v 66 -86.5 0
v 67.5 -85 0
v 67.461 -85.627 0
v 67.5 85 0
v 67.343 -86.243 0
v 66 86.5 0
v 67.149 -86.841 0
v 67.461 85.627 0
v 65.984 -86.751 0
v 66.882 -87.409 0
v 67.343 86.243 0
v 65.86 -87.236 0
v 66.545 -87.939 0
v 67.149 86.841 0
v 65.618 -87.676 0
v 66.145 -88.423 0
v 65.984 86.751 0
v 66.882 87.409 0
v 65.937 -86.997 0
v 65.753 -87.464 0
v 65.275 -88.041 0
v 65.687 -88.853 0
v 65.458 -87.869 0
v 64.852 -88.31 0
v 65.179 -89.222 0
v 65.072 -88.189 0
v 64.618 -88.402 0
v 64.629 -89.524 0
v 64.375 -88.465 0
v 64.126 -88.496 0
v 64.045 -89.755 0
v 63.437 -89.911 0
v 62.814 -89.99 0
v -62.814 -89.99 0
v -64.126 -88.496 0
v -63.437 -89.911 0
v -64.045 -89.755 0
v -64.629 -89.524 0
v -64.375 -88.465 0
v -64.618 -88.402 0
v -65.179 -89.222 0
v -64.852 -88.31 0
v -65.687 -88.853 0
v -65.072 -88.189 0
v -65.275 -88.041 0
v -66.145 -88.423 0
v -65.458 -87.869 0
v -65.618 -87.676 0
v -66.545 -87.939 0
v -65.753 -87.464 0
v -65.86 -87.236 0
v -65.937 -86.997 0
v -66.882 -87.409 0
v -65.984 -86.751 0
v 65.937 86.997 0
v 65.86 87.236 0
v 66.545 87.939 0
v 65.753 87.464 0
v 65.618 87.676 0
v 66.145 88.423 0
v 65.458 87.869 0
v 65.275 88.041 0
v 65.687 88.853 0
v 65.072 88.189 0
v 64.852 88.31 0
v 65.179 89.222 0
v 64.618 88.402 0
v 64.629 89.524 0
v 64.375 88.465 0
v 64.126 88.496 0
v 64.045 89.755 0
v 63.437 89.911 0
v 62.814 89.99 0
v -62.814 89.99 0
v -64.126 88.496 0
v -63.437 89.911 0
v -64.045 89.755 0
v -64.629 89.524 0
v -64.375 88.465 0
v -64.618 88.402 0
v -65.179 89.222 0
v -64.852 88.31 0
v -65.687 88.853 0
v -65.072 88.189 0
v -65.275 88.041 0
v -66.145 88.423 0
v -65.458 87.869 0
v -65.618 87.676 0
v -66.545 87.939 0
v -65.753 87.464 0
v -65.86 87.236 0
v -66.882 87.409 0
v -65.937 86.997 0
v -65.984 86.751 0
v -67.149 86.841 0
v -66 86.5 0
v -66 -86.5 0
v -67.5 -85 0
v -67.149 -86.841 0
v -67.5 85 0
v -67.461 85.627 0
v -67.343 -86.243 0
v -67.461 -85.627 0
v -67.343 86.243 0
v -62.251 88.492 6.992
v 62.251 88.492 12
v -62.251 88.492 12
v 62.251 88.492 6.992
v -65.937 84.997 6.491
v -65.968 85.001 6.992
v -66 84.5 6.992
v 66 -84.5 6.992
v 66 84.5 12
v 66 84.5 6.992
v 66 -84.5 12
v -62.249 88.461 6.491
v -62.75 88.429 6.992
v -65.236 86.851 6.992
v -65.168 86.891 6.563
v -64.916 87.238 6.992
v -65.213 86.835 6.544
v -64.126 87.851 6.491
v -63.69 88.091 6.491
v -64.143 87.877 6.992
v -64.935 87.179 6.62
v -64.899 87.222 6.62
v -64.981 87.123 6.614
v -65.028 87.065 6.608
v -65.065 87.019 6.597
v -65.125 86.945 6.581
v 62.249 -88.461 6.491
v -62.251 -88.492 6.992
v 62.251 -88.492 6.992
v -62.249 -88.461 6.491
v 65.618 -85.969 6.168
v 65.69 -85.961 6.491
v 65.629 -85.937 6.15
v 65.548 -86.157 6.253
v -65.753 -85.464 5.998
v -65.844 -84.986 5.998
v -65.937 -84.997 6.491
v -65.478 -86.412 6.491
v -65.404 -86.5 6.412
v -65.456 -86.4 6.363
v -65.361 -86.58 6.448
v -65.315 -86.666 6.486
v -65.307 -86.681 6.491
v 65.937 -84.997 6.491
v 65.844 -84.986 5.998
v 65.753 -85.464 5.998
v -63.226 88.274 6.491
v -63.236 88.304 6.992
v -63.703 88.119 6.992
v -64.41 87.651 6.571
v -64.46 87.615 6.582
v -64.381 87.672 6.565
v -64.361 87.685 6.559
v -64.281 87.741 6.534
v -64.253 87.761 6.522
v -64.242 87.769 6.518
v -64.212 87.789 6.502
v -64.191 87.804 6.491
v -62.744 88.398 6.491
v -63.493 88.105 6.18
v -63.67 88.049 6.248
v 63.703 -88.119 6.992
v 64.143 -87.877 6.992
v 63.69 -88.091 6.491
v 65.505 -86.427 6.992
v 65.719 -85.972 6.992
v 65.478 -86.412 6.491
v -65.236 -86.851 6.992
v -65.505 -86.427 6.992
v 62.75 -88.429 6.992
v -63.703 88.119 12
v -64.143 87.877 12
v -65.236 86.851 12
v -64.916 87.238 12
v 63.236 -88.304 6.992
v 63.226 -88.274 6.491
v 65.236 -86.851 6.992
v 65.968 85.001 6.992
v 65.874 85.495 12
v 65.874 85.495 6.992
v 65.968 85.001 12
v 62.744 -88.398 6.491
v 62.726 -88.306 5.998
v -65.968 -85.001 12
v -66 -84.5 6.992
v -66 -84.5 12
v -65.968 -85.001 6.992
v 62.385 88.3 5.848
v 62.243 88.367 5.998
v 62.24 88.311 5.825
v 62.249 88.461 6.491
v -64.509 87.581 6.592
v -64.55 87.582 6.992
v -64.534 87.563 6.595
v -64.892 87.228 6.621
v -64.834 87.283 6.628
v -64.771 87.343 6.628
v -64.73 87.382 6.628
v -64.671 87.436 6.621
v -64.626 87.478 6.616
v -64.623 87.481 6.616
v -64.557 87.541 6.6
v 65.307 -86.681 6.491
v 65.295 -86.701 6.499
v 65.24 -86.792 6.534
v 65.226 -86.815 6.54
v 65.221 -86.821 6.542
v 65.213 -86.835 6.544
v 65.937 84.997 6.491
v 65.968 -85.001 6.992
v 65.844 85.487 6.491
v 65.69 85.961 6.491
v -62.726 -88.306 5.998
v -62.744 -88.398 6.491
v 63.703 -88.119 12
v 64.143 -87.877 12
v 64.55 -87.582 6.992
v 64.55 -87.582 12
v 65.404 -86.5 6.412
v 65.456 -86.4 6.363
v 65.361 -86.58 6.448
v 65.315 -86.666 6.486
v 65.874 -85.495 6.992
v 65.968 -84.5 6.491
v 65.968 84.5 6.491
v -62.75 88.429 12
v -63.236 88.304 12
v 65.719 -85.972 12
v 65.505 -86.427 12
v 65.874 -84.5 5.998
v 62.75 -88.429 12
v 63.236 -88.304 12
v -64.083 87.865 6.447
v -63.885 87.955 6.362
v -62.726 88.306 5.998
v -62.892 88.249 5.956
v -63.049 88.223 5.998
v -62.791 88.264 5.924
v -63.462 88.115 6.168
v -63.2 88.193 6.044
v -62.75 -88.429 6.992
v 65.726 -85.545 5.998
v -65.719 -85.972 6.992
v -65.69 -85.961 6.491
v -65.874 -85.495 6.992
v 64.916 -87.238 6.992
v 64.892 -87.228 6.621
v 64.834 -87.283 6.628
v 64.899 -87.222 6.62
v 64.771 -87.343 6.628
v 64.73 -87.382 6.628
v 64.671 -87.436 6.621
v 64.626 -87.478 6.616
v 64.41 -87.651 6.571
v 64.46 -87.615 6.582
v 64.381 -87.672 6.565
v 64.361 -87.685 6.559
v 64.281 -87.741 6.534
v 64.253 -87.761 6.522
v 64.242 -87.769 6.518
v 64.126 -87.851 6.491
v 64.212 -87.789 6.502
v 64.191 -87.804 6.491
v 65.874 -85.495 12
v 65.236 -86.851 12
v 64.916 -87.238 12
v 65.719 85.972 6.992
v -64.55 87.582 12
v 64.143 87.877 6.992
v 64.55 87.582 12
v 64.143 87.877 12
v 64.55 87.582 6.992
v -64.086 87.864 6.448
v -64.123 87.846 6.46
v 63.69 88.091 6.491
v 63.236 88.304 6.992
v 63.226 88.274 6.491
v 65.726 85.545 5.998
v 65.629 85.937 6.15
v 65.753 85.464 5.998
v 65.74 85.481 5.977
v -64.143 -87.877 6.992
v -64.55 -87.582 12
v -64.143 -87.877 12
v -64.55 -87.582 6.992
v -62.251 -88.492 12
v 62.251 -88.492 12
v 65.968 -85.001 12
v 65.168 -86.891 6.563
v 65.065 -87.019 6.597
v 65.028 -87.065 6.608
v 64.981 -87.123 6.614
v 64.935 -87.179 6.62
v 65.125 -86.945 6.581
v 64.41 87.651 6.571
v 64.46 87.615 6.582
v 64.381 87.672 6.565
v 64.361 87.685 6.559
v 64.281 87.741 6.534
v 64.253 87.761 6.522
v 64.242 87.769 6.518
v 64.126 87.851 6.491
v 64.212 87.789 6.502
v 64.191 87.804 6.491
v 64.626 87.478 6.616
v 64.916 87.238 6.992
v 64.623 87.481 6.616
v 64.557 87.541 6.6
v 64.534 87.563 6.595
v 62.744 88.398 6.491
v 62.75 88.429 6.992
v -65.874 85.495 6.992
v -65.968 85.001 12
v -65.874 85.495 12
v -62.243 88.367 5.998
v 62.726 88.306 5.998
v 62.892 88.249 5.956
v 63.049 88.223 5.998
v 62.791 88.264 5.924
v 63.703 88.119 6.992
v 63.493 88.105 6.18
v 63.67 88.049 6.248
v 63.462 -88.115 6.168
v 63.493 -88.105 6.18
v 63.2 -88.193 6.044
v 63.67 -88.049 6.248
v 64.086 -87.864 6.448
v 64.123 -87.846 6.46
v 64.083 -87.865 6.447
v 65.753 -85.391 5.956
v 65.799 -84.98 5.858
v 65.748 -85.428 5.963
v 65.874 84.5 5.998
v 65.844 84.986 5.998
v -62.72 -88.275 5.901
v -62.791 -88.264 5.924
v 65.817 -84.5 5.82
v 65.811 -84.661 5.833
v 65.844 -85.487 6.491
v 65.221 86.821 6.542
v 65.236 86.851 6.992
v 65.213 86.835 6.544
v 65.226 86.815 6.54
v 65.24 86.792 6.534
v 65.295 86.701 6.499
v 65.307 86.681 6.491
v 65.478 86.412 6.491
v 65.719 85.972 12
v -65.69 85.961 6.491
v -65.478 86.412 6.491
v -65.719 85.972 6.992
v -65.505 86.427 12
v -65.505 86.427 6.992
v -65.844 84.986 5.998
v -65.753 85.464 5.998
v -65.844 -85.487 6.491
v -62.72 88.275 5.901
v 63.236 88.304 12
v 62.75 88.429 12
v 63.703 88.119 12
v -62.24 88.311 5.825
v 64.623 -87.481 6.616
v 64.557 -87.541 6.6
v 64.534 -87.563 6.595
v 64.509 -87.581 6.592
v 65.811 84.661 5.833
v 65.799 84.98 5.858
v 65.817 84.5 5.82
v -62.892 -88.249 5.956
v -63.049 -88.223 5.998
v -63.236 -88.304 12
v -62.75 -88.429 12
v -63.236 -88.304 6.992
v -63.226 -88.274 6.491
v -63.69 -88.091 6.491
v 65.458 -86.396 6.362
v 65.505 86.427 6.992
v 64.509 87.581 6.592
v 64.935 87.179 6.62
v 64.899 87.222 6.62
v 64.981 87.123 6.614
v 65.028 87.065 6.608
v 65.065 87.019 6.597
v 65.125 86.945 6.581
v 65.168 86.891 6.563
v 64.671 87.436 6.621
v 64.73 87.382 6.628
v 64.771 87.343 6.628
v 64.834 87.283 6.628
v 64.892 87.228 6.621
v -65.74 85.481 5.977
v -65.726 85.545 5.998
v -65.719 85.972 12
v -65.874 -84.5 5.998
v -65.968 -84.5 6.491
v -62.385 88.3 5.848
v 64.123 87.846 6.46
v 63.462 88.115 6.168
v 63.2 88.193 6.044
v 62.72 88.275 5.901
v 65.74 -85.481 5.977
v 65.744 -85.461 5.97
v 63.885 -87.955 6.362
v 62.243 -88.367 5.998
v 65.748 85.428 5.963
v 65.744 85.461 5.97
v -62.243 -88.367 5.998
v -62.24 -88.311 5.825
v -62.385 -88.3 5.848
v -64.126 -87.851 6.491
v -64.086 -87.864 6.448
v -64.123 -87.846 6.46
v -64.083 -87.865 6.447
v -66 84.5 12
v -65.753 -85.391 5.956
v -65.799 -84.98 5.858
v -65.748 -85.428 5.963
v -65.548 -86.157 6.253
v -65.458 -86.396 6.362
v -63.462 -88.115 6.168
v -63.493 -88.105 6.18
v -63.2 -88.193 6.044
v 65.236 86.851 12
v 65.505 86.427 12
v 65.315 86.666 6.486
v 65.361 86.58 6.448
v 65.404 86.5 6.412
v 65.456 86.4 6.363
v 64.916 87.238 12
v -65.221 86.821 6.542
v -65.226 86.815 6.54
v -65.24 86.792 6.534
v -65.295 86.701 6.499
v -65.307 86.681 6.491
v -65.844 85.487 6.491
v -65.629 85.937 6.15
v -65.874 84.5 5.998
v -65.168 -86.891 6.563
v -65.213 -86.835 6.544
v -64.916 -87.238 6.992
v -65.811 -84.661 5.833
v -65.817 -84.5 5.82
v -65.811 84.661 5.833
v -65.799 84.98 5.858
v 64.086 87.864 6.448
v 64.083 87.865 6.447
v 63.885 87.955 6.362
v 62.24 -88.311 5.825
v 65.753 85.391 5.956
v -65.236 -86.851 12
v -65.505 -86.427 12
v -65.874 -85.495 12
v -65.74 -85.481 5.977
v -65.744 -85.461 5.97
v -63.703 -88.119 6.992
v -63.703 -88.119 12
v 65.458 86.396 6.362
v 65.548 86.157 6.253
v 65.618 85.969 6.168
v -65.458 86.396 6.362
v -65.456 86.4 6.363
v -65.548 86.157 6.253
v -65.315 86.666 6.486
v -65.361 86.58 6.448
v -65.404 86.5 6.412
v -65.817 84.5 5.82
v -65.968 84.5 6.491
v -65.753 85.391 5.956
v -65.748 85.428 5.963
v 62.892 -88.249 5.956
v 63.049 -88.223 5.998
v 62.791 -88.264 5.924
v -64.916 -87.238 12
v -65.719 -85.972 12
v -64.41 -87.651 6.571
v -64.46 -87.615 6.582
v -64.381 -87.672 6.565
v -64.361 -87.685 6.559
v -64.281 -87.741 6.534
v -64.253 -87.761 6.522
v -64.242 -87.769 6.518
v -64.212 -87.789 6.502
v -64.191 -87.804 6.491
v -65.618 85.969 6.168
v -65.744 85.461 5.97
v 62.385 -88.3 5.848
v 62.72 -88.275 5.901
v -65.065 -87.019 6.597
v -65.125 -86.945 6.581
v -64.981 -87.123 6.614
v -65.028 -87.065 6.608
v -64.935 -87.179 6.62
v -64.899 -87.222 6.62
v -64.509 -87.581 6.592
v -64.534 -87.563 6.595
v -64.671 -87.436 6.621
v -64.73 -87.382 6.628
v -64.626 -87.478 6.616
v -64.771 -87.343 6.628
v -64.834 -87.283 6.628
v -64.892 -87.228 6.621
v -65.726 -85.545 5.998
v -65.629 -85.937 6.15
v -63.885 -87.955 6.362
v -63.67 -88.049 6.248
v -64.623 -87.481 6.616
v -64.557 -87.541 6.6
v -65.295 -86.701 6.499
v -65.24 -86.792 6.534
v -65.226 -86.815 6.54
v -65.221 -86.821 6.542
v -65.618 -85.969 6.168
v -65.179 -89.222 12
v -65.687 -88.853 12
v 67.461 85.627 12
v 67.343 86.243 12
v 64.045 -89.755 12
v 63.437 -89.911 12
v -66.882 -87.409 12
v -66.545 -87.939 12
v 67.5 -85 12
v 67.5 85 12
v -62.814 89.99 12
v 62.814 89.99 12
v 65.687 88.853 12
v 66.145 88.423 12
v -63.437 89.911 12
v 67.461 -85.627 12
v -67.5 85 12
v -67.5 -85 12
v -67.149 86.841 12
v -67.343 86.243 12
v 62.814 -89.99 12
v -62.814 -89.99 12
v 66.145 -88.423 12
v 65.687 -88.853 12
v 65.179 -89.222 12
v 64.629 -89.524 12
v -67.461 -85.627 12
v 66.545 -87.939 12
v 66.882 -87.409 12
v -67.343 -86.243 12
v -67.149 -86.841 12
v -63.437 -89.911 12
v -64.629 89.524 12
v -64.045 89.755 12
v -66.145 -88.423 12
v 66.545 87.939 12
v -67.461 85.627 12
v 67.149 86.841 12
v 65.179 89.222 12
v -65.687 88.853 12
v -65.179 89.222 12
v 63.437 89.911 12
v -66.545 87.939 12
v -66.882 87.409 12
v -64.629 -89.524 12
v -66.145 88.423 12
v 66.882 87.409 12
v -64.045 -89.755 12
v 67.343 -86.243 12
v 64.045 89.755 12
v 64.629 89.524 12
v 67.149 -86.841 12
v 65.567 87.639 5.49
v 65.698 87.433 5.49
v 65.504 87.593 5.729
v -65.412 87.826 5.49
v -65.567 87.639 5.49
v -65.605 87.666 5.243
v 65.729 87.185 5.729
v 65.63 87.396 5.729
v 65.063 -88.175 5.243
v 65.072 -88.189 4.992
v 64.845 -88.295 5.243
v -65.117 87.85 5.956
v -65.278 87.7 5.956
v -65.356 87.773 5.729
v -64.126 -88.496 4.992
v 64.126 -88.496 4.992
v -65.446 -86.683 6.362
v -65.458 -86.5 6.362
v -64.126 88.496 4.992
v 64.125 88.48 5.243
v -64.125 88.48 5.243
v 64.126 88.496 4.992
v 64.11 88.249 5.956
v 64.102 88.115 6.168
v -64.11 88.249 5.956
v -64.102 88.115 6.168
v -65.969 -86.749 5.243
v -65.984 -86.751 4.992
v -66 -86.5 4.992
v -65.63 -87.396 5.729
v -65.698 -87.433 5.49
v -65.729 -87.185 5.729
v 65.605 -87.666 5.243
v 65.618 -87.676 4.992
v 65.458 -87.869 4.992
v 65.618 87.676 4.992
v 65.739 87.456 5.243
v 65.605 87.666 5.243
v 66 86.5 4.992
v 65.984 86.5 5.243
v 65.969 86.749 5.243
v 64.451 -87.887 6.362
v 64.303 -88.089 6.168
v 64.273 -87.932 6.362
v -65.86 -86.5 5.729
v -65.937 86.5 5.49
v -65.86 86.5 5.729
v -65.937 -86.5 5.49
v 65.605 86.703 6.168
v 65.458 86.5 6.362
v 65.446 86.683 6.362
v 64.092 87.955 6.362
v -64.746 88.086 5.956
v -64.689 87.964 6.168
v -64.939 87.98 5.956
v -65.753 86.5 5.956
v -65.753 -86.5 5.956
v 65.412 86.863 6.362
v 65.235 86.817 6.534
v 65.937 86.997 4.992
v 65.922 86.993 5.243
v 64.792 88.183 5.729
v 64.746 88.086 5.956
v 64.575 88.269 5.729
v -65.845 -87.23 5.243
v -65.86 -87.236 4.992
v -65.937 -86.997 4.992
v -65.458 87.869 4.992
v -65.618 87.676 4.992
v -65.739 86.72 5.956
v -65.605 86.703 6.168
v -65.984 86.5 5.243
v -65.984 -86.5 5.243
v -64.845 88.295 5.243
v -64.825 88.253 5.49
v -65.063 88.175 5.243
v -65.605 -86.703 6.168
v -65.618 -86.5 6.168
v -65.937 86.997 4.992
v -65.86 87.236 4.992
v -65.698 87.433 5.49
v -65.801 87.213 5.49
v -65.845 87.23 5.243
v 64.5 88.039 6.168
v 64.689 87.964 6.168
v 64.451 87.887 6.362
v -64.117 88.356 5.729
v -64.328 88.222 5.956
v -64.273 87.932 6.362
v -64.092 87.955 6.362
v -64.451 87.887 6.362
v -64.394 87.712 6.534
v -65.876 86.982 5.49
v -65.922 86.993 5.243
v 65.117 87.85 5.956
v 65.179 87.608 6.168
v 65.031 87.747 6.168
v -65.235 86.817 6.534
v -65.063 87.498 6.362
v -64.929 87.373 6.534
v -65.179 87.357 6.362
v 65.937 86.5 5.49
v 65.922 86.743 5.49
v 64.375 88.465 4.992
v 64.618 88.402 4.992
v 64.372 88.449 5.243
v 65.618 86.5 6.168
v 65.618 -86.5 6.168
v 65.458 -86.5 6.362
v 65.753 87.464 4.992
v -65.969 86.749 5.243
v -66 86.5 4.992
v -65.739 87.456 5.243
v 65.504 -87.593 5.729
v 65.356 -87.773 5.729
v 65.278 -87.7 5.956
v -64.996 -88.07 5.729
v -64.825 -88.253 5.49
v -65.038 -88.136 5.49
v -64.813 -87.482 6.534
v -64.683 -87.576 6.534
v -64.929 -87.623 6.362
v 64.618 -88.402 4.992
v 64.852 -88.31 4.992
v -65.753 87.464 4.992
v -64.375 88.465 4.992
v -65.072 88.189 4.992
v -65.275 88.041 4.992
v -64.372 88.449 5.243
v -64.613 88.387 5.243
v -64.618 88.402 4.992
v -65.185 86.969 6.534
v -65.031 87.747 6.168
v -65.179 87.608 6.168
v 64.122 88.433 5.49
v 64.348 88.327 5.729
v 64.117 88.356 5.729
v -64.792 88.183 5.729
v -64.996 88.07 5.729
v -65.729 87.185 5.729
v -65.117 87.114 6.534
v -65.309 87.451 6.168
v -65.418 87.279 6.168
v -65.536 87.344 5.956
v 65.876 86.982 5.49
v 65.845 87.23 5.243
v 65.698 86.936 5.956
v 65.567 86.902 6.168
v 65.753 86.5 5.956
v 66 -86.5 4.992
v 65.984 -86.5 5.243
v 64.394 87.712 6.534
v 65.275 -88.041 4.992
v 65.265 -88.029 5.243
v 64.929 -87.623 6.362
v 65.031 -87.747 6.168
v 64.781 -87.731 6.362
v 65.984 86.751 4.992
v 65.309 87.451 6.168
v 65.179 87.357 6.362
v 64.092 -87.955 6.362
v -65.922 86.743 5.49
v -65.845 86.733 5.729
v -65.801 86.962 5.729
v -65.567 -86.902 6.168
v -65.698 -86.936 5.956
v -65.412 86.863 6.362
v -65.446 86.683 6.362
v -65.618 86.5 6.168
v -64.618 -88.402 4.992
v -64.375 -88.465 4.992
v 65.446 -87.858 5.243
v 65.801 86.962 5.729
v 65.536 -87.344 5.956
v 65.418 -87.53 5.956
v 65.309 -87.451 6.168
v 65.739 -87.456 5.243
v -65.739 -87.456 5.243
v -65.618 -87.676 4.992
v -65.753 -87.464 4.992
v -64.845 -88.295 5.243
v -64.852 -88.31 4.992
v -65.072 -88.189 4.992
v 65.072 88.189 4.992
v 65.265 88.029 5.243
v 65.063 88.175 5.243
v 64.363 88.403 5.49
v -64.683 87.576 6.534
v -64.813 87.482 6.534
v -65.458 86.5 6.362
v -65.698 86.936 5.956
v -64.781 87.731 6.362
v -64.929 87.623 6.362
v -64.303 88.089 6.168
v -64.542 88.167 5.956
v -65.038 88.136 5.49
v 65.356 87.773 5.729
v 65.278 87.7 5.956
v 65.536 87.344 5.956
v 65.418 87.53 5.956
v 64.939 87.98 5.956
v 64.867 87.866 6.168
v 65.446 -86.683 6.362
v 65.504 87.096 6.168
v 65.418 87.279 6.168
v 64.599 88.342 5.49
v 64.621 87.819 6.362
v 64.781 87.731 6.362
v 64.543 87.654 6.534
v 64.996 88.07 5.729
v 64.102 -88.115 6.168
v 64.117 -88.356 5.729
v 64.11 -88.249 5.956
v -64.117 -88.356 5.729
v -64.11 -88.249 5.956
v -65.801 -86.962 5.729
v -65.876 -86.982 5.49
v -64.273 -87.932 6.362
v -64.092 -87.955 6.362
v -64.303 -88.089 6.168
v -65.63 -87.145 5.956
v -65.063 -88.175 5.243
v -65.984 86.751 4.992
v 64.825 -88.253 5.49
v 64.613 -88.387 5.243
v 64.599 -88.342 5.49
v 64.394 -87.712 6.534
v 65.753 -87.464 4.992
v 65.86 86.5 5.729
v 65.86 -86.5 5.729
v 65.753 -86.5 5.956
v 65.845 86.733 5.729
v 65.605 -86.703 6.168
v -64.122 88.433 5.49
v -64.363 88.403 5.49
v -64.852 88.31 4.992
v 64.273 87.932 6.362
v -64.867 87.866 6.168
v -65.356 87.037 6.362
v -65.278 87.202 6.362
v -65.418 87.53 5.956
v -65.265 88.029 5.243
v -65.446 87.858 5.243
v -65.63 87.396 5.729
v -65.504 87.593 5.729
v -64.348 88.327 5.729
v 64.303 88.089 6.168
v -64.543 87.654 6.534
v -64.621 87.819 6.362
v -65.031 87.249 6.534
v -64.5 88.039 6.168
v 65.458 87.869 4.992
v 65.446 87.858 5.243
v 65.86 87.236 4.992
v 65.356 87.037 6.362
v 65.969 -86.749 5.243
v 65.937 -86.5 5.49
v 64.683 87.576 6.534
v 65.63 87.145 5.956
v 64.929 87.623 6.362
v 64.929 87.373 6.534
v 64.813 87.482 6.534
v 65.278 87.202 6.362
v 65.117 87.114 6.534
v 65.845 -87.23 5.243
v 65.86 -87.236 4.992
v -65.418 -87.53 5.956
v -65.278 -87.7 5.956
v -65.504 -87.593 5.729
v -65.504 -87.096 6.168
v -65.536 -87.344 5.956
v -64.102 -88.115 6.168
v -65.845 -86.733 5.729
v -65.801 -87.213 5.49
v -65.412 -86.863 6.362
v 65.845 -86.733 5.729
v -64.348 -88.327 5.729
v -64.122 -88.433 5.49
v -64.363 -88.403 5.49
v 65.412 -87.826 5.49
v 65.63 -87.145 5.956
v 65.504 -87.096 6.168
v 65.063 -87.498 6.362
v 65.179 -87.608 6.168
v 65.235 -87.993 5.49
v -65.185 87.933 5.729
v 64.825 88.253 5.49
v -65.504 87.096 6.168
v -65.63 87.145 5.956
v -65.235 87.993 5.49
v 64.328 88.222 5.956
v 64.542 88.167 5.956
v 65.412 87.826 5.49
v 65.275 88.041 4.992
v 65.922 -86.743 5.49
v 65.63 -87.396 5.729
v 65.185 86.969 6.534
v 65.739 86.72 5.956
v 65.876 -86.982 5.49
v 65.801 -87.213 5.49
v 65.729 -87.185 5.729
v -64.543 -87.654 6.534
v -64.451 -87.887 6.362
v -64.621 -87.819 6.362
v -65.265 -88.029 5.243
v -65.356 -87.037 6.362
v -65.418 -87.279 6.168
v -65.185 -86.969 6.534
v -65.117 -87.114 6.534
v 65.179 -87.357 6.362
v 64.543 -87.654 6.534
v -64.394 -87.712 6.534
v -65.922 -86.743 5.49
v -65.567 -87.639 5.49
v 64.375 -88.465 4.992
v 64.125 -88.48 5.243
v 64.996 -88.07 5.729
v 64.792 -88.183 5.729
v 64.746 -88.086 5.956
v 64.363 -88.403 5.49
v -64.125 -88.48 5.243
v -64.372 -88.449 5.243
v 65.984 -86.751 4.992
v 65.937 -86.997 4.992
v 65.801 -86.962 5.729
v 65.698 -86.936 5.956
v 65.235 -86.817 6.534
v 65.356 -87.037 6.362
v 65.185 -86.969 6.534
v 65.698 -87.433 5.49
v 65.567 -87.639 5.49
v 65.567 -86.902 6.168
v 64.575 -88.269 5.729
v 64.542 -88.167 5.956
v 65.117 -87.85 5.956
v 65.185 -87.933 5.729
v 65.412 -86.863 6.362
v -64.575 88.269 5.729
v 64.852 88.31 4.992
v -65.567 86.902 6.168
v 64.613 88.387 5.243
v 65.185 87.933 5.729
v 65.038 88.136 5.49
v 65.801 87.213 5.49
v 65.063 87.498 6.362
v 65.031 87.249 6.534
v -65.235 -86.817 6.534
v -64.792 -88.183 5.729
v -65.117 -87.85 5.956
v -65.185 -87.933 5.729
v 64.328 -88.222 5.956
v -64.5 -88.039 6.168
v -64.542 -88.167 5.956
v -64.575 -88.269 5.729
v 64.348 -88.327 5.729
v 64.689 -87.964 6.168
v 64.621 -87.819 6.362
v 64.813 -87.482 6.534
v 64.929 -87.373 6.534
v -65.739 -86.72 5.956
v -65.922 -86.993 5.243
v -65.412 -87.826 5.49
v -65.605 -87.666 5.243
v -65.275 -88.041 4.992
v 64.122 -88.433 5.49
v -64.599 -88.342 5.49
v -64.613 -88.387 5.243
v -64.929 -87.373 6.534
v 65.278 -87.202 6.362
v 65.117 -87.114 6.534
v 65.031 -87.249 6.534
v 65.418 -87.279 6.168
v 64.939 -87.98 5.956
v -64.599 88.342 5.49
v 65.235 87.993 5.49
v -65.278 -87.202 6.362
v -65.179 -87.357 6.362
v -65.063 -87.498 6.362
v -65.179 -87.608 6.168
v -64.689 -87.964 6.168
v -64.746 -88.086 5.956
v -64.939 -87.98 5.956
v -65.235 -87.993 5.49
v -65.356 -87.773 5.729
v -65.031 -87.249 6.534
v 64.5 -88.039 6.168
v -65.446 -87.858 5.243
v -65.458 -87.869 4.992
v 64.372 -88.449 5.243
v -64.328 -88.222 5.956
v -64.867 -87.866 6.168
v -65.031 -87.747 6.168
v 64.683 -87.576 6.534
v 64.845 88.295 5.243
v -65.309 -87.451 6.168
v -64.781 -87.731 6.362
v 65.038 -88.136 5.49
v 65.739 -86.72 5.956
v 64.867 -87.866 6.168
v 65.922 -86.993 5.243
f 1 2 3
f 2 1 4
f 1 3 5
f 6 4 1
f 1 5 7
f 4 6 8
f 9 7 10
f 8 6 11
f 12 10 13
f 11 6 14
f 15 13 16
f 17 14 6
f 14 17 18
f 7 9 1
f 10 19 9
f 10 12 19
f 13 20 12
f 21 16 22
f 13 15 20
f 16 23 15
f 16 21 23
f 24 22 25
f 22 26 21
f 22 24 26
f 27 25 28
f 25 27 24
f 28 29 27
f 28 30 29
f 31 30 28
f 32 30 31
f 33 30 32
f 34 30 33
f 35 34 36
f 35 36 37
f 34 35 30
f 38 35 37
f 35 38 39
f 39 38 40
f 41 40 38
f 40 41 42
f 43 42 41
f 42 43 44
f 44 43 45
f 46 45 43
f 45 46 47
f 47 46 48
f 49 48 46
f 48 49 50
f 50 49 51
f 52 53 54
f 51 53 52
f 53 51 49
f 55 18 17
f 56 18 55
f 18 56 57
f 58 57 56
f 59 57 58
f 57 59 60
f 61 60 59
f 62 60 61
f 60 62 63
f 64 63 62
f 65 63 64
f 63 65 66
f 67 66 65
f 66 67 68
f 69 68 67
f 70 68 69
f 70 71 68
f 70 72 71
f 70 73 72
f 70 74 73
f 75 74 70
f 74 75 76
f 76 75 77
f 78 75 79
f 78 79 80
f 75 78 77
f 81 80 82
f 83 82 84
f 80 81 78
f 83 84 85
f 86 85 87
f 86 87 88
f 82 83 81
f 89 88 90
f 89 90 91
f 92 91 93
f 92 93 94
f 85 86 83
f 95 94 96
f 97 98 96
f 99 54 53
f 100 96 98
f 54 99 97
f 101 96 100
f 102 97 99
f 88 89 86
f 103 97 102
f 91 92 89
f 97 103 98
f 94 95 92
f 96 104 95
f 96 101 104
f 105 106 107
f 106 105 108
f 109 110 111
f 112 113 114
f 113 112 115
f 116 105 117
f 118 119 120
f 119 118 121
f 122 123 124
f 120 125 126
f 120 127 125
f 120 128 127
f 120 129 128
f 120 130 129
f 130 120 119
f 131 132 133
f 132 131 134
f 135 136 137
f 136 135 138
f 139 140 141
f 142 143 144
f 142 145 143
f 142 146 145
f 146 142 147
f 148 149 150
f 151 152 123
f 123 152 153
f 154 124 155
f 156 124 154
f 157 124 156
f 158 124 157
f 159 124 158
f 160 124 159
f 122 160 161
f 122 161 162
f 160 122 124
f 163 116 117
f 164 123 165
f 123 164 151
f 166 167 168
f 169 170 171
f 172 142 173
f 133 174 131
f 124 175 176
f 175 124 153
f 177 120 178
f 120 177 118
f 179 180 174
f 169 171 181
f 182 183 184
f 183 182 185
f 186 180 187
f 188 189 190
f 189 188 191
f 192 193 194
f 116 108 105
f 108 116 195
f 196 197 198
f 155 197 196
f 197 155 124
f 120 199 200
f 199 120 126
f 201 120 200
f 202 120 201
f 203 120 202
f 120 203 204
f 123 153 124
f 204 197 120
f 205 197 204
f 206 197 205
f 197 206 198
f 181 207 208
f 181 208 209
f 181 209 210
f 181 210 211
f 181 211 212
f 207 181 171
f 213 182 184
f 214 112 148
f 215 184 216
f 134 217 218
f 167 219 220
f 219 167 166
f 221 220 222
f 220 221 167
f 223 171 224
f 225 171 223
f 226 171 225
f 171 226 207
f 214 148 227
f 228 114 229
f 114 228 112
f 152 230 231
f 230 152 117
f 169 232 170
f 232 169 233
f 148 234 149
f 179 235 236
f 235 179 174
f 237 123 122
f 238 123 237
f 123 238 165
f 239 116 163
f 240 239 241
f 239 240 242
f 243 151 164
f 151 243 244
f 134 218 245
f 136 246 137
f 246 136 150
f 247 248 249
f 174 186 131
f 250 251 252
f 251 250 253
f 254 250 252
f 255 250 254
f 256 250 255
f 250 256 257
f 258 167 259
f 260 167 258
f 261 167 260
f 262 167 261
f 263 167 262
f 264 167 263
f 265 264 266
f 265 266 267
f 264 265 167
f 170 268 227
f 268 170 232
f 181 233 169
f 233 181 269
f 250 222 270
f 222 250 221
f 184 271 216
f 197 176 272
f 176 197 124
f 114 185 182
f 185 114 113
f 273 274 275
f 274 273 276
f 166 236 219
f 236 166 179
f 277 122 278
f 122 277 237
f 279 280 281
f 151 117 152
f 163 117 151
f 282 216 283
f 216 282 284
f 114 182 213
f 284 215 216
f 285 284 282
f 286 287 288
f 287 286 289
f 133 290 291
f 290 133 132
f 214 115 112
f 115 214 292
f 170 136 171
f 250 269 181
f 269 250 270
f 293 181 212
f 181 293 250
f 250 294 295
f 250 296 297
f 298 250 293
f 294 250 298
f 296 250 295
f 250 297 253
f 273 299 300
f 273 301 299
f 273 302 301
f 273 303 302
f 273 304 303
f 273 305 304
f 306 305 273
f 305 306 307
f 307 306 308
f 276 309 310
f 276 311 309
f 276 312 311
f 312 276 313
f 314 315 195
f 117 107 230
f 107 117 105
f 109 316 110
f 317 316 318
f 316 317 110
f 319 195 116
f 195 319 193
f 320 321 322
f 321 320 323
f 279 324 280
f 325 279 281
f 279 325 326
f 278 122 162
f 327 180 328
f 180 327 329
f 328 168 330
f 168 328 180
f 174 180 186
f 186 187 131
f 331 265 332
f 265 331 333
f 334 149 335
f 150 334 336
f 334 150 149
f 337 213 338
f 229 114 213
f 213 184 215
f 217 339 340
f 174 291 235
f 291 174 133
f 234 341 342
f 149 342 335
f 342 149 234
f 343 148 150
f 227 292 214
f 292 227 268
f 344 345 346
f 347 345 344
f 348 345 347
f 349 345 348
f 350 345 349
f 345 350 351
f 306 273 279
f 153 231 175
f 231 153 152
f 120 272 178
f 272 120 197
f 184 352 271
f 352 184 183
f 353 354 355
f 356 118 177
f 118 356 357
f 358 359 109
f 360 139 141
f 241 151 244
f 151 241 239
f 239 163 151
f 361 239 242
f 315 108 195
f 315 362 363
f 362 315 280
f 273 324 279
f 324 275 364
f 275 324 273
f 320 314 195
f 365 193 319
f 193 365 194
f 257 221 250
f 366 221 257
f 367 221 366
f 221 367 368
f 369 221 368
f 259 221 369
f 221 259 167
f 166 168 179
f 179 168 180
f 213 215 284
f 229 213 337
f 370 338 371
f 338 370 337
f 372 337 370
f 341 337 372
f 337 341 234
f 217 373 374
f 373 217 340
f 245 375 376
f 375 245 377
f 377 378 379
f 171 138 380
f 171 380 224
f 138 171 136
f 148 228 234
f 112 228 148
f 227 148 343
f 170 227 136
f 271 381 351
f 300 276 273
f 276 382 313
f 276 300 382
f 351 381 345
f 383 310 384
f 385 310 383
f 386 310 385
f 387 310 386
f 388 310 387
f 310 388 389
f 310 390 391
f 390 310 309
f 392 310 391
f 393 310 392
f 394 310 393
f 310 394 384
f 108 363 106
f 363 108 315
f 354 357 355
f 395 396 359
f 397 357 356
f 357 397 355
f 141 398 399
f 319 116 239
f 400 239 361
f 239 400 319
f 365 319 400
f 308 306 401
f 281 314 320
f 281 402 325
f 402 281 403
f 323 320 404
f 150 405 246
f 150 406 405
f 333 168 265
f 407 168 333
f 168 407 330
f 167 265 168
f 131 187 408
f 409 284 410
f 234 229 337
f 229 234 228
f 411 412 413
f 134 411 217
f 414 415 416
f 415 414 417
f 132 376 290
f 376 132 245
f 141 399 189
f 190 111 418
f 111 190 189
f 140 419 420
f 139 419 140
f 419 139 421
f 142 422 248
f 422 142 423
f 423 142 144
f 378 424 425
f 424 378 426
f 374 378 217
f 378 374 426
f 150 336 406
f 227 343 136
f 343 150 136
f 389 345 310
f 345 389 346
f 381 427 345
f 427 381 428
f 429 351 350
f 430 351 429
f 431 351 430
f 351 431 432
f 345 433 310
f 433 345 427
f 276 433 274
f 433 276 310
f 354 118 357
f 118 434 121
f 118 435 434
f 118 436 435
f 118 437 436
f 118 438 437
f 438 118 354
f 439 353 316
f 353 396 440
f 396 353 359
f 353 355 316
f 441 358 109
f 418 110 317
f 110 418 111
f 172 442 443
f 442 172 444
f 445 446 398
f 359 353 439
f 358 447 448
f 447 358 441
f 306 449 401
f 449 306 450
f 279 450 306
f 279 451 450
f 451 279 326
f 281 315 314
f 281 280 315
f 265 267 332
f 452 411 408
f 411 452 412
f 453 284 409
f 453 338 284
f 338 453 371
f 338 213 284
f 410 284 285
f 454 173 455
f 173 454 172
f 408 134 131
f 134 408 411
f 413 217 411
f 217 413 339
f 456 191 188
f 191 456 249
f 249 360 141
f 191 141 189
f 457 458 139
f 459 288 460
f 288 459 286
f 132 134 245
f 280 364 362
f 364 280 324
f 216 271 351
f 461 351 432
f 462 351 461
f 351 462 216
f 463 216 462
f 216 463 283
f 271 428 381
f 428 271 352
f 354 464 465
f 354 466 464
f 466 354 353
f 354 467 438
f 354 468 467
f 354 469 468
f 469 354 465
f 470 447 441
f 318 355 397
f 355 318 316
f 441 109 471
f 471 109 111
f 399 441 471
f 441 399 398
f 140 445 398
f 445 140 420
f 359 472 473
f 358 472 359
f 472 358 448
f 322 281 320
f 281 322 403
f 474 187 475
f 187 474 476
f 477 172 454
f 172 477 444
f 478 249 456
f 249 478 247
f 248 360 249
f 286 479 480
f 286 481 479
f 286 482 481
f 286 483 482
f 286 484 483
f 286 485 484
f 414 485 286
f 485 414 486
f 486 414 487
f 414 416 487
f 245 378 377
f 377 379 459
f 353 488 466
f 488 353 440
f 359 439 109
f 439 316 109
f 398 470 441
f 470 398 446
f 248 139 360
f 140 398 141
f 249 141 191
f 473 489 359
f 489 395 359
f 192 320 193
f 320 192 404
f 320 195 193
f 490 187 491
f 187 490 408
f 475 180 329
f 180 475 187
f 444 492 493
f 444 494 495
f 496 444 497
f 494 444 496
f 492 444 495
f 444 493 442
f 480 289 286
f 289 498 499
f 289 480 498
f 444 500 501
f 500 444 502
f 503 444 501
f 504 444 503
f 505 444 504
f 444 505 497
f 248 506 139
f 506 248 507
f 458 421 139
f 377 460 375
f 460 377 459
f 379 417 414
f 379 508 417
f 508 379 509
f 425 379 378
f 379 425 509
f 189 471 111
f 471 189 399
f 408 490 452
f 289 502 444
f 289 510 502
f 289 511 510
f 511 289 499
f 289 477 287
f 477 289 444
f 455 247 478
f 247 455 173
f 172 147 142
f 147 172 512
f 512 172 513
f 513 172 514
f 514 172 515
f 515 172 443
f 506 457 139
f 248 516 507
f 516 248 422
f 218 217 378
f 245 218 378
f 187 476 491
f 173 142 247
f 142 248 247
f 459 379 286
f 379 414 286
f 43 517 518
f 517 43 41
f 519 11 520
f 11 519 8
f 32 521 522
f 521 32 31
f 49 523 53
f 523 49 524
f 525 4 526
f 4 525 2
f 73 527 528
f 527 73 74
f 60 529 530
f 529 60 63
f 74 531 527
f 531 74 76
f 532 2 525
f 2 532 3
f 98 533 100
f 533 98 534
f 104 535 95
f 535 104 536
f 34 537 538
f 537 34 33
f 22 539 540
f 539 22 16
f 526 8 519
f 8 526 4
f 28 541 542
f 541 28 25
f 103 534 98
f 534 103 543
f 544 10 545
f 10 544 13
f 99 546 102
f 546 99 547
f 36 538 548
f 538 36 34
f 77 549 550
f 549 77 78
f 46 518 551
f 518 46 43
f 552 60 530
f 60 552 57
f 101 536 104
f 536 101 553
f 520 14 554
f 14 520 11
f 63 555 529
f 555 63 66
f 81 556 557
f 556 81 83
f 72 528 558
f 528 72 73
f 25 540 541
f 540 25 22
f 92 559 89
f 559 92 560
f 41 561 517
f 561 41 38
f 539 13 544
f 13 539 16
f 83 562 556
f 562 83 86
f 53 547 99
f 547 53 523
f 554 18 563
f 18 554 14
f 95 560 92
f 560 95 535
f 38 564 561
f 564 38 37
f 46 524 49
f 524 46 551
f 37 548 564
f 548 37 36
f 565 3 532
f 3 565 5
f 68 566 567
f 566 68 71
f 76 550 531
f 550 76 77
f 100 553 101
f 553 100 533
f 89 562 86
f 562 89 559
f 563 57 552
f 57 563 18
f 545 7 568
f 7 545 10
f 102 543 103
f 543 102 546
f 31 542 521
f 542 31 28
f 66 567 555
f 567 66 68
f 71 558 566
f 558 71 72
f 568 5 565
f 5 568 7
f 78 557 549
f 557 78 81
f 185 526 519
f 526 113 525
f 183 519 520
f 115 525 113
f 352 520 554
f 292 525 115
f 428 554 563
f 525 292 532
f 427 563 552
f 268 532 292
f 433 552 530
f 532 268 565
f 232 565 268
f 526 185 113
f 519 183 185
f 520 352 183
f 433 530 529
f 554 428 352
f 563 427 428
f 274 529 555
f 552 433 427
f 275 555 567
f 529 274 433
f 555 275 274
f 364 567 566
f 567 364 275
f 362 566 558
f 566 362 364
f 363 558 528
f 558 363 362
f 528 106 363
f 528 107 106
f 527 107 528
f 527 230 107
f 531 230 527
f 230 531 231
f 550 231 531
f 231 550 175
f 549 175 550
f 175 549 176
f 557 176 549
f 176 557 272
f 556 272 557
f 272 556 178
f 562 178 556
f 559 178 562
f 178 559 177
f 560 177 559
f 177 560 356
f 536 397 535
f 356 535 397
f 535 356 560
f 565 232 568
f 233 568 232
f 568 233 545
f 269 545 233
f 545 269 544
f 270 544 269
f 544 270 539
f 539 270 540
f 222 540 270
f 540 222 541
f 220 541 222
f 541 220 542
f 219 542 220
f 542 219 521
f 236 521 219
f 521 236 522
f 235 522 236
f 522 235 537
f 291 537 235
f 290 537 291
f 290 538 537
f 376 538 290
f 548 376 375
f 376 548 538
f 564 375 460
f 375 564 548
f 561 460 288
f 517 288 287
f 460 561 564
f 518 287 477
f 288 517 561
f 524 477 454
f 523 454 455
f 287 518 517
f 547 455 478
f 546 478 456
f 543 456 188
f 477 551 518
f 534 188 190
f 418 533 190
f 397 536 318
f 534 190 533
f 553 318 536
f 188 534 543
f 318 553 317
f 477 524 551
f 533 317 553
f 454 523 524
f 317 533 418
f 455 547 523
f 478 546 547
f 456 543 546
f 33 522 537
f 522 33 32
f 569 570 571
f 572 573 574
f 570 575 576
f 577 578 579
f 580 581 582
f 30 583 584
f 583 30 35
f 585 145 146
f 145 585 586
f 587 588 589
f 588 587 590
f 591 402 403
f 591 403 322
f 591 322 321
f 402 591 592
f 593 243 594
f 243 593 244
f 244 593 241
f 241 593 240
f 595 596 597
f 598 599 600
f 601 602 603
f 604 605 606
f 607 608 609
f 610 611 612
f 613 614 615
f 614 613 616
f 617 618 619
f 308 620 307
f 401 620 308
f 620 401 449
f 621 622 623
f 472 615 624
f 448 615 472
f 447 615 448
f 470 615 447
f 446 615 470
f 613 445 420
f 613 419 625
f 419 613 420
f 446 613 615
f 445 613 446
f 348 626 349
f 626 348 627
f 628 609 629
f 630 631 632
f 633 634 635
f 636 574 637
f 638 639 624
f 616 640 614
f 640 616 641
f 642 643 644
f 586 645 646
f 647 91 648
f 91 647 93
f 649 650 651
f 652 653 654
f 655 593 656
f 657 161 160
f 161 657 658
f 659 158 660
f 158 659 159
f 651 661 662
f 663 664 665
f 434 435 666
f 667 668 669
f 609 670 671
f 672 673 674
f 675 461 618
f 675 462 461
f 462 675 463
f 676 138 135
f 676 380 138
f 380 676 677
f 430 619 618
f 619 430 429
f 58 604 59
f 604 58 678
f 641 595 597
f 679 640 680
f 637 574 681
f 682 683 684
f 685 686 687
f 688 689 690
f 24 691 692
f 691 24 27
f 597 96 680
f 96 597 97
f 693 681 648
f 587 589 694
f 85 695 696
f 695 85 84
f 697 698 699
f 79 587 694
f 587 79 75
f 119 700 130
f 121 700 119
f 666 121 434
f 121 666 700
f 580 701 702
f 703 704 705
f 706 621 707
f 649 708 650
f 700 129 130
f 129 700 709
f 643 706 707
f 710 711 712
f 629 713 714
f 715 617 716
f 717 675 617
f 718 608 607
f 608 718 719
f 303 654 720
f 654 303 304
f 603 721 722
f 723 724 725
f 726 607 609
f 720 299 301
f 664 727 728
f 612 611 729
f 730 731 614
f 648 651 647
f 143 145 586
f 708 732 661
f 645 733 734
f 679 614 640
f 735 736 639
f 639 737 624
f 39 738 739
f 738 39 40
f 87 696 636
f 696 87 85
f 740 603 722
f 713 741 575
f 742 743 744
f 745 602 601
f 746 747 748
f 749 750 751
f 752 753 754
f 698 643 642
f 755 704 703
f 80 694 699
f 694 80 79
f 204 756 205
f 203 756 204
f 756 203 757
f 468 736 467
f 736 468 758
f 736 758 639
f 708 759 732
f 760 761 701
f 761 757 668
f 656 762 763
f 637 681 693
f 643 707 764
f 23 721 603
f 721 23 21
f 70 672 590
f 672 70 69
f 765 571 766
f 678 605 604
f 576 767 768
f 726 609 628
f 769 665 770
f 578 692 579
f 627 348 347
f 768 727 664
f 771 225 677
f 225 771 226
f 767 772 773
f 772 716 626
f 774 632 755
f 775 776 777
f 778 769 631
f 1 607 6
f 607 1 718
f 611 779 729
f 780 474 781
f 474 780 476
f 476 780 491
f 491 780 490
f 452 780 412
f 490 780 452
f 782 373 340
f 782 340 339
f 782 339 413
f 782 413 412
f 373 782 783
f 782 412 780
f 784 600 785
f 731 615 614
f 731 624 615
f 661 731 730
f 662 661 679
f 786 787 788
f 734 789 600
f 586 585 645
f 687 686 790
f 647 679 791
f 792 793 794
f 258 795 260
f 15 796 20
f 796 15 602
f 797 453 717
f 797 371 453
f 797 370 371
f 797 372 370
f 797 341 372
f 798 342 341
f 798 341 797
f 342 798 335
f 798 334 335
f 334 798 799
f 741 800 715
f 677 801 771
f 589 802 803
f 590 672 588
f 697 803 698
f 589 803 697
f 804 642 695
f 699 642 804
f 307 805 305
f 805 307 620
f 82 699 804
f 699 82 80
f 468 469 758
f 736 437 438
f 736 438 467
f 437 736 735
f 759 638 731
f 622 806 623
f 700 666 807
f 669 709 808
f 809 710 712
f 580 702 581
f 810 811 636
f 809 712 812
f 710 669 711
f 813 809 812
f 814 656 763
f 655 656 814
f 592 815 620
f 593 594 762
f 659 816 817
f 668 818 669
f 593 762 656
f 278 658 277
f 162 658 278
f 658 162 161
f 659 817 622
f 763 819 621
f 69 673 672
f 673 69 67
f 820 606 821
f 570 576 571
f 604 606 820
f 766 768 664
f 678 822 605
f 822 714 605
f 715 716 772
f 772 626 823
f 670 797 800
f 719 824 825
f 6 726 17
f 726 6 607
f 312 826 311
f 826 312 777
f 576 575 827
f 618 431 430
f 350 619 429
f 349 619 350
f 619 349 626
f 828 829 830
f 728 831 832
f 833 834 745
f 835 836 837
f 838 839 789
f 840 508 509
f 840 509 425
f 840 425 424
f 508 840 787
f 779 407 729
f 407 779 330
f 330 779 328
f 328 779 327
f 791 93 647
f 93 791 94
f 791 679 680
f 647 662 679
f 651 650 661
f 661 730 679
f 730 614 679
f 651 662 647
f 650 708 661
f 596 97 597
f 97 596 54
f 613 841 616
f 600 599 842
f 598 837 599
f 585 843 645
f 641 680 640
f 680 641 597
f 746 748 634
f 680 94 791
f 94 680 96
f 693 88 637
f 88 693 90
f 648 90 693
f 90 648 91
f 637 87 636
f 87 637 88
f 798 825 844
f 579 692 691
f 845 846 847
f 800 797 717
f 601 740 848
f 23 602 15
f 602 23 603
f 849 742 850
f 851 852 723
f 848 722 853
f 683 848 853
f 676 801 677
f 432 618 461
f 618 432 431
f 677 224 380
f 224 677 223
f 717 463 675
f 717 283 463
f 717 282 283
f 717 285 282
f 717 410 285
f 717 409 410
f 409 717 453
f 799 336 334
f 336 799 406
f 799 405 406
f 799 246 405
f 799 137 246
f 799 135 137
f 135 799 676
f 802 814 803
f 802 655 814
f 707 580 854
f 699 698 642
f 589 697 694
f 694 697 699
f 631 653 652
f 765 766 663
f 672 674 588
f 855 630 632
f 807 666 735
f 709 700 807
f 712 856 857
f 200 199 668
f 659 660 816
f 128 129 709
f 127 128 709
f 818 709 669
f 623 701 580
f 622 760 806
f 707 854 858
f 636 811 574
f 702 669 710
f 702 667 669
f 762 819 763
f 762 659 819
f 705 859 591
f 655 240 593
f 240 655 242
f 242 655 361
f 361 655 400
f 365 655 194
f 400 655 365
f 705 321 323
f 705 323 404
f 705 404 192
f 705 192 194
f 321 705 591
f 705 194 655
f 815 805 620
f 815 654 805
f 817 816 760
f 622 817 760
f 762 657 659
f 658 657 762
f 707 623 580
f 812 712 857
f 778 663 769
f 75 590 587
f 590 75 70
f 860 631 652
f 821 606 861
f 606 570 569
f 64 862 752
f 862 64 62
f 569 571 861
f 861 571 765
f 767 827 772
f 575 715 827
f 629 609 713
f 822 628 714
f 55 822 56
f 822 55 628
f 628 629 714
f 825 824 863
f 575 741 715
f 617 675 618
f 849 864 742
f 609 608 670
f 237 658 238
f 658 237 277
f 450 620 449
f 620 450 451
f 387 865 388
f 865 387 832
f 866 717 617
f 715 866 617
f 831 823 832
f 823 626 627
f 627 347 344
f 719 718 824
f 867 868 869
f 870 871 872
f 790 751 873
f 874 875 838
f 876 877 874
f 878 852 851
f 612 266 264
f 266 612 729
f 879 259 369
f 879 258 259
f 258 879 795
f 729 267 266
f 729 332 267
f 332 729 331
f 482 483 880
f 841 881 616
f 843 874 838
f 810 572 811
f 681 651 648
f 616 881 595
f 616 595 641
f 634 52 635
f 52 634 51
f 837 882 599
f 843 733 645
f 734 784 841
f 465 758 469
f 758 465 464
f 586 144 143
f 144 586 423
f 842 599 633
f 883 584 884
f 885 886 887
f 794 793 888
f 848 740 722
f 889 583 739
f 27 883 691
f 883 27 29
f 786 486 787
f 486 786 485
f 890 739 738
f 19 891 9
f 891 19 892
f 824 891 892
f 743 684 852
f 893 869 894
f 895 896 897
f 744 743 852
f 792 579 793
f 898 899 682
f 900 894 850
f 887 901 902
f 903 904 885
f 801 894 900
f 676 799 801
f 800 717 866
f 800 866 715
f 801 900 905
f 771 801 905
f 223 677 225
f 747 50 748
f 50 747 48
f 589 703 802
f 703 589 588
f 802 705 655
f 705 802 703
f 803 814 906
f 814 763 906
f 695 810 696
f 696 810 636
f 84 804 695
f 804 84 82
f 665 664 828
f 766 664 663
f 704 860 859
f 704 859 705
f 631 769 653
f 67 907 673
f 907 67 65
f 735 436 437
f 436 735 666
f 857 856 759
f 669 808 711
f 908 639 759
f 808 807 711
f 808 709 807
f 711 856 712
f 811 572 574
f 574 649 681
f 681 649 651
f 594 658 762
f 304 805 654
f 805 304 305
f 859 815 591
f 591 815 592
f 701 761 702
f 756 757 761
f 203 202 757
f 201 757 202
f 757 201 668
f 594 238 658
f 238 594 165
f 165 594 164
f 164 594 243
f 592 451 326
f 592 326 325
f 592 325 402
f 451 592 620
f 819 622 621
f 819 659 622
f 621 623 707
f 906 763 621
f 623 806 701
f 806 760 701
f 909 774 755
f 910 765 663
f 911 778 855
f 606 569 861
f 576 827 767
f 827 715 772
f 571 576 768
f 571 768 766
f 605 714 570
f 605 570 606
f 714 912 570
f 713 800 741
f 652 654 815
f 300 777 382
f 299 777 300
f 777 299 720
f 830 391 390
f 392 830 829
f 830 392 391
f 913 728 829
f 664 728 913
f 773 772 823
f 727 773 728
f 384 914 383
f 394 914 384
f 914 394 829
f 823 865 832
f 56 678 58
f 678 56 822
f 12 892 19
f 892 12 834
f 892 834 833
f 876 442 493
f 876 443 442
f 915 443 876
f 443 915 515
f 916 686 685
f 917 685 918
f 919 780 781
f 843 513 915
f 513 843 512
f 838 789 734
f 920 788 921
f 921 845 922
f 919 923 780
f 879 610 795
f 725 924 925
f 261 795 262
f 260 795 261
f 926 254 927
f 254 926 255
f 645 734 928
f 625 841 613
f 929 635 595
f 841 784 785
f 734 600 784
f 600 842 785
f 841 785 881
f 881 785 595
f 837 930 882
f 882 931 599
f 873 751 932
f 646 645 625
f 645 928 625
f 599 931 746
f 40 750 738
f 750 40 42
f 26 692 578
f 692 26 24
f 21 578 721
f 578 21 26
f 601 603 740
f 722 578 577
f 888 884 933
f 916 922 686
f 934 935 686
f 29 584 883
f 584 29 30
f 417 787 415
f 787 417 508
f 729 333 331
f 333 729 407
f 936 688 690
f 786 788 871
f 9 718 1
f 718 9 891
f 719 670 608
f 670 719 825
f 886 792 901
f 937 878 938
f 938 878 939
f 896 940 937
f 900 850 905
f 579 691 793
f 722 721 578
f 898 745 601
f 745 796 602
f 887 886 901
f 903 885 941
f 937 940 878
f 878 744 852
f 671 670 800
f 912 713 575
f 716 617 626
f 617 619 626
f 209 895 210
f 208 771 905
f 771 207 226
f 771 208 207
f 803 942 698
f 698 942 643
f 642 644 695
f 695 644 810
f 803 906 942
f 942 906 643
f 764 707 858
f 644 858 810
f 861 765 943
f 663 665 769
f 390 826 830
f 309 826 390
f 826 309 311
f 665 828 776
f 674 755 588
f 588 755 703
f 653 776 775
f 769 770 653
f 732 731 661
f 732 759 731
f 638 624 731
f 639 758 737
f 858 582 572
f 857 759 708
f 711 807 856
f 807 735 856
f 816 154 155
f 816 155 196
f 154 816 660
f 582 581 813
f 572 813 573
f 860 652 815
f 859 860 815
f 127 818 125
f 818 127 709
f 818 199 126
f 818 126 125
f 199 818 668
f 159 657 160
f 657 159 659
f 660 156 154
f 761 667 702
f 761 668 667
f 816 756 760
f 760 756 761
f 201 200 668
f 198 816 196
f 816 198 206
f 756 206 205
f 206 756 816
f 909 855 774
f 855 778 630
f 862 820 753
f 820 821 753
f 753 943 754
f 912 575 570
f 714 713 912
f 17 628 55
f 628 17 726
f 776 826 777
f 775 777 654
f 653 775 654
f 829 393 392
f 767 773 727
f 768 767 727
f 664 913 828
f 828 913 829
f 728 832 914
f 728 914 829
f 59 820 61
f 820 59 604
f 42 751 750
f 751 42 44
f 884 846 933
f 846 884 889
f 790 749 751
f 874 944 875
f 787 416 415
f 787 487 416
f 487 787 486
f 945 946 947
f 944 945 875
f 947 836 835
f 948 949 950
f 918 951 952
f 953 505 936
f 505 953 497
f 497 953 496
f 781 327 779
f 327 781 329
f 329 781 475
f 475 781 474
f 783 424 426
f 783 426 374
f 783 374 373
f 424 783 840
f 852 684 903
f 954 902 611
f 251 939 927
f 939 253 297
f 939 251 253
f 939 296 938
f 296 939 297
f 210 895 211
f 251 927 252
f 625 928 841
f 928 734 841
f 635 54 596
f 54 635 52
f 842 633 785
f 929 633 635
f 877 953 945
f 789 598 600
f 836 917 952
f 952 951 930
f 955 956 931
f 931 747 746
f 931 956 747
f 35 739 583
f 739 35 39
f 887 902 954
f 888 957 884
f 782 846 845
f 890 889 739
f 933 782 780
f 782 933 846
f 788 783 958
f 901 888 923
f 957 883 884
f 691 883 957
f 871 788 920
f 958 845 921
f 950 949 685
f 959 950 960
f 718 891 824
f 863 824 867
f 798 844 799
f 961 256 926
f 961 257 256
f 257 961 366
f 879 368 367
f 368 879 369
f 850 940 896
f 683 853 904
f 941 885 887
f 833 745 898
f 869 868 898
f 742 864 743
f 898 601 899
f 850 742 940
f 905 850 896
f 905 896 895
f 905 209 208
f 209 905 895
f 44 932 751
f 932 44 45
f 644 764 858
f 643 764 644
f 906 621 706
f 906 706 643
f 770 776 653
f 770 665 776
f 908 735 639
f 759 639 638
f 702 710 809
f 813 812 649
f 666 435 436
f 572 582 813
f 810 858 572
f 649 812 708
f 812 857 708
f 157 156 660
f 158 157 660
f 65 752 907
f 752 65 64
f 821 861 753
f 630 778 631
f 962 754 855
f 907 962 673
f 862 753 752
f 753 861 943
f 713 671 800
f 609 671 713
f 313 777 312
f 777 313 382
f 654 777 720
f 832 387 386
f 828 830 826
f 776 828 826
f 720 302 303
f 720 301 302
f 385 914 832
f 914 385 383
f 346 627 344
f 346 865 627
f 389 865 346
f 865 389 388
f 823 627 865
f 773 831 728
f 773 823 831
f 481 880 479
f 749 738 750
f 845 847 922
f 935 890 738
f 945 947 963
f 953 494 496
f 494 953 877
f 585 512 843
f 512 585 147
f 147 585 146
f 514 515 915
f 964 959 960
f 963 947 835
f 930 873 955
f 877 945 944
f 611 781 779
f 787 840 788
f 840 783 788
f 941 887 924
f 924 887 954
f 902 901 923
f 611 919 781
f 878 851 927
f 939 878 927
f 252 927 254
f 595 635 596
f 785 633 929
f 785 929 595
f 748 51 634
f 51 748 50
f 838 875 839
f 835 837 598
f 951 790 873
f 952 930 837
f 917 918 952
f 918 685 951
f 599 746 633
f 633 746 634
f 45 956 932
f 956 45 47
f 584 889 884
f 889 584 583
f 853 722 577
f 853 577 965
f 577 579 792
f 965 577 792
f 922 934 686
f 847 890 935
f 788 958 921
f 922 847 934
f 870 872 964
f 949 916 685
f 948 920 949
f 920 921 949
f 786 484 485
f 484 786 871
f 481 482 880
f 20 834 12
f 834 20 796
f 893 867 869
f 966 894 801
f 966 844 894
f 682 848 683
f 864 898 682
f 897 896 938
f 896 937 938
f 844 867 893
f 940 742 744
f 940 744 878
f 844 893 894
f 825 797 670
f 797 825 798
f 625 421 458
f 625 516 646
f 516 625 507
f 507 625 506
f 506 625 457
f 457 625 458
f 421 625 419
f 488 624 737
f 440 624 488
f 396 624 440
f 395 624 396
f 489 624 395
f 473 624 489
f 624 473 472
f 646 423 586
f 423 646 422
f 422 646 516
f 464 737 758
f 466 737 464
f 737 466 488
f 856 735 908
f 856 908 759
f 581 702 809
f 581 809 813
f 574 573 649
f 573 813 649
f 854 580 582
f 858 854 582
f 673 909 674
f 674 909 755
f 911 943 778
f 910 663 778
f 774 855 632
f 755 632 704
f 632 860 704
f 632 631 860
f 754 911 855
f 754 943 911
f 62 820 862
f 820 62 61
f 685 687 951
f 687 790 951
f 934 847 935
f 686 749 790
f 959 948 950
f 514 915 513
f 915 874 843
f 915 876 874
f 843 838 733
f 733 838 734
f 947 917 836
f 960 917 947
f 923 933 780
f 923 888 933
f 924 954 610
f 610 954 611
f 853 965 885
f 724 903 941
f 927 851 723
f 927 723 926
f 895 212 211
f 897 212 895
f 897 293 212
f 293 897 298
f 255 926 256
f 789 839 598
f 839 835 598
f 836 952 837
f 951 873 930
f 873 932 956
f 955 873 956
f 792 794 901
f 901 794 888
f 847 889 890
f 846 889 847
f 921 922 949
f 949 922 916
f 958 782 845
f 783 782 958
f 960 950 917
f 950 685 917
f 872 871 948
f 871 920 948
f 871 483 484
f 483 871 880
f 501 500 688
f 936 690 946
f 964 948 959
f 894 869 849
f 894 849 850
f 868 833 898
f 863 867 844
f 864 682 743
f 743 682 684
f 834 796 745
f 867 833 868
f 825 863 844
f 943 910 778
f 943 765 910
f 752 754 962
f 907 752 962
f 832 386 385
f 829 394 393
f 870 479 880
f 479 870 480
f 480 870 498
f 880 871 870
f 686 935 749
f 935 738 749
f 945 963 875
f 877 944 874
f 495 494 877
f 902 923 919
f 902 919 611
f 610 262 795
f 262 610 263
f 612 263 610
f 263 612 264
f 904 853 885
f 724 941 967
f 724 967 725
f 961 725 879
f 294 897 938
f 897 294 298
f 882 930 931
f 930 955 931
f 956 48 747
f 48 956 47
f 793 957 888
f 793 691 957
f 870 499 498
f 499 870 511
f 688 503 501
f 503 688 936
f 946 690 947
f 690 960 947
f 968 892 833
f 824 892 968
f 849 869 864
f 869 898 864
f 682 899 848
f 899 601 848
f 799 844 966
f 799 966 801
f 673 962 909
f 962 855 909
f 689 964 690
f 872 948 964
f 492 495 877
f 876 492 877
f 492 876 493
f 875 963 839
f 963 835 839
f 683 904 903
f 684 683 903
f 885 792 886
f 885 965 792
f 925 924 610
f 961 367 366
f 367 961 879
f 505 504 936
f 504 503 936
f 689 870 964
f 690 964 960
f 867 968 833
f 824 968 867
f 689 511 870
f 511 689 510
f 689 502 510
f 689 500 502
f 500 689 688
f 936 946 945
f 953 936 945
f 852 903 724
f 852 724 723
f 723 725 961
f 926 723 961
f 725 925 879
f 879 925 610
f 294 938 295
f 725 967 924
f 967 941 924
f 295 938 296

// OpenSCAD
$fn = 50;


difference() {
	difference() {
		union() {
			hull() {
				translate(v = [-62.5000000000, 85.0000000000, 0]) {
					cylinder(h = 12, r = 5);
				}
				translate(v = [62.5000000000, 85.0000000000, 0]) {
					cylinder(h = 12, r = 5);
				}
				translate(v = [-62.5000000000, -85.0000000000, 0]) {
					cylinder(h = 12, r = 5);
				}
				translate(v = [62.5000000000, -85.0000000000, 0]) {
					cylinder(h = 12, r = 5);
				}
			}
		}
		union() {
			translate(v = [-60.0000000000, -82.5000000000, 3]) {
				rotate(a = [0, 0, 0]) {
					difference() {
						union() {
							translate(v = [0, 0, -3.0000000000]) {
								cylinder(h = 3, r = 1.5000000000);
							}
							translate(v = [0, 0, -1.9000000000]) {
								cylinder(h = 1.9000000000, r1 = 1.8000000000, r2 = 3.6000000000);
							}
							cylinder(h = 250, r = 3.6000000000);
							translate(v = [0, 0, -3.0000000000]) {
								cylinder(h = 3, r = 1.8000000000);
							}
							translate(v = [0, 0, -3.0000000000]) {
								cylinder(h = 3, r = 1.5000000000);
							}
						}
						union();
					}
				}
			}
			translate(v = [60.0000000000, -82.5000000000, 3]) {
				rotate(a = [0, 0, 0]) {
					difference() {
						union() {
							translate(v = [0, 0, -3.0000000000]) {
								cylinder(h = 3, r = 1.5000000000);
							}
							translate(v = [0, 0, -1.9000000000]) {
								cylinder(h = 1.9000000000, r1 = 1.8000000000, r2 = 3.6000000000);
							}
							cylinder(h = 250, r = 3.6000000000);
							translate(v = [0, 0, -3.0000000000]) {
								cylinder(h = 3, r = 1.8000000000);
							}
							translate(v = [0, 0, -3.0000000000]) {
								cylinder(h = 3, r = 1.5000000000);
							}
						}
						union();
					}
				}
			}
			translate(v = [-60.0000000000, 82.5000000000, 3]) {
				rotate(a = [0, 0, 0]) {
					difference() {
						union() {
							translate(v = [0, 0, -3.0000000000]) {
								cylinder(h = 3, r = 1.5000000000);
							}
							translate(v = [0, 0, -1.9000000000]) {
								cylinder(h = 1.9000000000, r1 = 1.8000000000, r2 = 3.6000000000);
							}
							cylinder(h = 250, r = 3.6000000000);
							translate(v = [0, 0, -3.0000000000]) {
								cylinder(h = 3, r = 1.8000000000);
							}
							translate(v = [0, 0, -3.0000000000]) {
								cylinder(h = 3, r = 1.5000000000);
							}
						}
						union();
					}
				}
			}
			translate(v = [60.0000000000, 82.5000000000, 3]) {
				rotate(a = [0, 0, 0]) {
					difference() {
						union() {
							translate(v = [0, 0, -3.0000000000]) {
								cylinder(h = 3, r = 1.5000000000);
							}
							translate(v = [0, 0, -1.9000000000]) {
								cylinder(h = 1.9000000000, r1 = 1.8000000000, r2 = 3.6000000000);
							}
							cylinder(h = 250, r = 3.6000000000);
							translate(v = [0, 0, -3.0000000000]) {
								cylinder(h = 3, r = 1.8000000000);
							}
							translate(v = [0, 0, -3.0000000000]) {
								cylinder(h = 3, r = 1.5000000000);
							}
						}
						union();
					}
				}
			}
			translate(v = [0, 0, 2.9925000000]) {
				hull() {
					union() {
						translate(v = [-62.0000000000, 84.5000000000, 4]) {
							cylinder(h = 49, r = 4);
						}
						translate(v = [-62.0000000000, 84.5000000000, 4]) {
							sphere(r = 4);
						}
						translate(v = [-62.0000000000, 84.5000000000, 53]) {
							sphere(r = 4);
						}
					}
					union() {
						translate(v = [62.0000000000, 84.5000000000, 4]) {
							cylinder(h = 49, r = 4);
						}
						translate(v = [62.0000000000, 84.5000000000, 4]) {
							sphere(r = 4);
						}
						translate(v = [62.0000000000, 84.5000000000, 53]) {
							sphere(r = 4);
						}
					}
					union() {
						translate(v = [-62.0000000000, -84.5000000000, 4]) {
							cylinder(h = 49, r = 4);
						}
						translate(v = [-62.0000000000, -84.5000000000, 4]) {
							sphere(r = 4);
						}
						translate(v = [-62.0000000000, -84.5000000000, 53]) {
							sphere(r = 4);
						}
					}
					union() {
						translate(v = [62.0000000000, -84.5000000000, 4]) {
							cylinder(h = 49, r = 4);
						}
						translate(v = [62.0000000000, -84.5000000000, 4]) {
							sphere(r = 4);
						}
						translate(v = [62.0000000000, -84.5000000000, 53]) {
							sphere(r = 4);
						}
					}
				}
			}
		}
	}
	union() {
		translate(v = [0, 0, 2.9925000000]) {
			hull() {
				union() {
					translate(v = [-64.0000000000, 86.5000000000, 2]) {
						cylinder(h = -7, r = 2);
					}
					translate(v = [-64.0000000000, 86.5000000000, 2]) {
						sphere(r = 2);
					}
					translate(v = [-64.0000000000, 86.5000000000, -5]) {
						sphere(r = 2);
					}
				}
				union() {
					translate(v = [64.0000000000, 86.5000000000, 2]) {
						cylinder(h = -7, r = 2);
					}
					translate(v = [64.0000000000, 86.5000000000, 2]) {
						sphere(r = 2);
					}
					translate(v = [64.0000000000, 86.5000000000, -5]) {
						sphere(r = 2);
					}
				}
				union() {
					translate(v = [-64.0000000000, -86.5000000000, 2]) {
						cylinder(h = -7, r = 2);
					}
					translate(v = [-64.0000000000, -86.5000000000, 2]) {
						sphere(r = 2);
					}
					translate(v = [-64.0000000000, -86.5000000000, -5]) {
						sphere(r = 2);
					}
				}
				union() {
					translate(v = [64.0000000000, -86.5000000000, 2]) {
						cylinder(h = -7, r = 2);
					}
					translate(v = [64.0000000000, -86.5000000000, 2]) {
						sphere(r = 2);
					}
					translate(v = [64.0000000000, -86.5000000000, -5]) {
						sphere(r = 2);
					}
				}
			}
		}
	}
}
